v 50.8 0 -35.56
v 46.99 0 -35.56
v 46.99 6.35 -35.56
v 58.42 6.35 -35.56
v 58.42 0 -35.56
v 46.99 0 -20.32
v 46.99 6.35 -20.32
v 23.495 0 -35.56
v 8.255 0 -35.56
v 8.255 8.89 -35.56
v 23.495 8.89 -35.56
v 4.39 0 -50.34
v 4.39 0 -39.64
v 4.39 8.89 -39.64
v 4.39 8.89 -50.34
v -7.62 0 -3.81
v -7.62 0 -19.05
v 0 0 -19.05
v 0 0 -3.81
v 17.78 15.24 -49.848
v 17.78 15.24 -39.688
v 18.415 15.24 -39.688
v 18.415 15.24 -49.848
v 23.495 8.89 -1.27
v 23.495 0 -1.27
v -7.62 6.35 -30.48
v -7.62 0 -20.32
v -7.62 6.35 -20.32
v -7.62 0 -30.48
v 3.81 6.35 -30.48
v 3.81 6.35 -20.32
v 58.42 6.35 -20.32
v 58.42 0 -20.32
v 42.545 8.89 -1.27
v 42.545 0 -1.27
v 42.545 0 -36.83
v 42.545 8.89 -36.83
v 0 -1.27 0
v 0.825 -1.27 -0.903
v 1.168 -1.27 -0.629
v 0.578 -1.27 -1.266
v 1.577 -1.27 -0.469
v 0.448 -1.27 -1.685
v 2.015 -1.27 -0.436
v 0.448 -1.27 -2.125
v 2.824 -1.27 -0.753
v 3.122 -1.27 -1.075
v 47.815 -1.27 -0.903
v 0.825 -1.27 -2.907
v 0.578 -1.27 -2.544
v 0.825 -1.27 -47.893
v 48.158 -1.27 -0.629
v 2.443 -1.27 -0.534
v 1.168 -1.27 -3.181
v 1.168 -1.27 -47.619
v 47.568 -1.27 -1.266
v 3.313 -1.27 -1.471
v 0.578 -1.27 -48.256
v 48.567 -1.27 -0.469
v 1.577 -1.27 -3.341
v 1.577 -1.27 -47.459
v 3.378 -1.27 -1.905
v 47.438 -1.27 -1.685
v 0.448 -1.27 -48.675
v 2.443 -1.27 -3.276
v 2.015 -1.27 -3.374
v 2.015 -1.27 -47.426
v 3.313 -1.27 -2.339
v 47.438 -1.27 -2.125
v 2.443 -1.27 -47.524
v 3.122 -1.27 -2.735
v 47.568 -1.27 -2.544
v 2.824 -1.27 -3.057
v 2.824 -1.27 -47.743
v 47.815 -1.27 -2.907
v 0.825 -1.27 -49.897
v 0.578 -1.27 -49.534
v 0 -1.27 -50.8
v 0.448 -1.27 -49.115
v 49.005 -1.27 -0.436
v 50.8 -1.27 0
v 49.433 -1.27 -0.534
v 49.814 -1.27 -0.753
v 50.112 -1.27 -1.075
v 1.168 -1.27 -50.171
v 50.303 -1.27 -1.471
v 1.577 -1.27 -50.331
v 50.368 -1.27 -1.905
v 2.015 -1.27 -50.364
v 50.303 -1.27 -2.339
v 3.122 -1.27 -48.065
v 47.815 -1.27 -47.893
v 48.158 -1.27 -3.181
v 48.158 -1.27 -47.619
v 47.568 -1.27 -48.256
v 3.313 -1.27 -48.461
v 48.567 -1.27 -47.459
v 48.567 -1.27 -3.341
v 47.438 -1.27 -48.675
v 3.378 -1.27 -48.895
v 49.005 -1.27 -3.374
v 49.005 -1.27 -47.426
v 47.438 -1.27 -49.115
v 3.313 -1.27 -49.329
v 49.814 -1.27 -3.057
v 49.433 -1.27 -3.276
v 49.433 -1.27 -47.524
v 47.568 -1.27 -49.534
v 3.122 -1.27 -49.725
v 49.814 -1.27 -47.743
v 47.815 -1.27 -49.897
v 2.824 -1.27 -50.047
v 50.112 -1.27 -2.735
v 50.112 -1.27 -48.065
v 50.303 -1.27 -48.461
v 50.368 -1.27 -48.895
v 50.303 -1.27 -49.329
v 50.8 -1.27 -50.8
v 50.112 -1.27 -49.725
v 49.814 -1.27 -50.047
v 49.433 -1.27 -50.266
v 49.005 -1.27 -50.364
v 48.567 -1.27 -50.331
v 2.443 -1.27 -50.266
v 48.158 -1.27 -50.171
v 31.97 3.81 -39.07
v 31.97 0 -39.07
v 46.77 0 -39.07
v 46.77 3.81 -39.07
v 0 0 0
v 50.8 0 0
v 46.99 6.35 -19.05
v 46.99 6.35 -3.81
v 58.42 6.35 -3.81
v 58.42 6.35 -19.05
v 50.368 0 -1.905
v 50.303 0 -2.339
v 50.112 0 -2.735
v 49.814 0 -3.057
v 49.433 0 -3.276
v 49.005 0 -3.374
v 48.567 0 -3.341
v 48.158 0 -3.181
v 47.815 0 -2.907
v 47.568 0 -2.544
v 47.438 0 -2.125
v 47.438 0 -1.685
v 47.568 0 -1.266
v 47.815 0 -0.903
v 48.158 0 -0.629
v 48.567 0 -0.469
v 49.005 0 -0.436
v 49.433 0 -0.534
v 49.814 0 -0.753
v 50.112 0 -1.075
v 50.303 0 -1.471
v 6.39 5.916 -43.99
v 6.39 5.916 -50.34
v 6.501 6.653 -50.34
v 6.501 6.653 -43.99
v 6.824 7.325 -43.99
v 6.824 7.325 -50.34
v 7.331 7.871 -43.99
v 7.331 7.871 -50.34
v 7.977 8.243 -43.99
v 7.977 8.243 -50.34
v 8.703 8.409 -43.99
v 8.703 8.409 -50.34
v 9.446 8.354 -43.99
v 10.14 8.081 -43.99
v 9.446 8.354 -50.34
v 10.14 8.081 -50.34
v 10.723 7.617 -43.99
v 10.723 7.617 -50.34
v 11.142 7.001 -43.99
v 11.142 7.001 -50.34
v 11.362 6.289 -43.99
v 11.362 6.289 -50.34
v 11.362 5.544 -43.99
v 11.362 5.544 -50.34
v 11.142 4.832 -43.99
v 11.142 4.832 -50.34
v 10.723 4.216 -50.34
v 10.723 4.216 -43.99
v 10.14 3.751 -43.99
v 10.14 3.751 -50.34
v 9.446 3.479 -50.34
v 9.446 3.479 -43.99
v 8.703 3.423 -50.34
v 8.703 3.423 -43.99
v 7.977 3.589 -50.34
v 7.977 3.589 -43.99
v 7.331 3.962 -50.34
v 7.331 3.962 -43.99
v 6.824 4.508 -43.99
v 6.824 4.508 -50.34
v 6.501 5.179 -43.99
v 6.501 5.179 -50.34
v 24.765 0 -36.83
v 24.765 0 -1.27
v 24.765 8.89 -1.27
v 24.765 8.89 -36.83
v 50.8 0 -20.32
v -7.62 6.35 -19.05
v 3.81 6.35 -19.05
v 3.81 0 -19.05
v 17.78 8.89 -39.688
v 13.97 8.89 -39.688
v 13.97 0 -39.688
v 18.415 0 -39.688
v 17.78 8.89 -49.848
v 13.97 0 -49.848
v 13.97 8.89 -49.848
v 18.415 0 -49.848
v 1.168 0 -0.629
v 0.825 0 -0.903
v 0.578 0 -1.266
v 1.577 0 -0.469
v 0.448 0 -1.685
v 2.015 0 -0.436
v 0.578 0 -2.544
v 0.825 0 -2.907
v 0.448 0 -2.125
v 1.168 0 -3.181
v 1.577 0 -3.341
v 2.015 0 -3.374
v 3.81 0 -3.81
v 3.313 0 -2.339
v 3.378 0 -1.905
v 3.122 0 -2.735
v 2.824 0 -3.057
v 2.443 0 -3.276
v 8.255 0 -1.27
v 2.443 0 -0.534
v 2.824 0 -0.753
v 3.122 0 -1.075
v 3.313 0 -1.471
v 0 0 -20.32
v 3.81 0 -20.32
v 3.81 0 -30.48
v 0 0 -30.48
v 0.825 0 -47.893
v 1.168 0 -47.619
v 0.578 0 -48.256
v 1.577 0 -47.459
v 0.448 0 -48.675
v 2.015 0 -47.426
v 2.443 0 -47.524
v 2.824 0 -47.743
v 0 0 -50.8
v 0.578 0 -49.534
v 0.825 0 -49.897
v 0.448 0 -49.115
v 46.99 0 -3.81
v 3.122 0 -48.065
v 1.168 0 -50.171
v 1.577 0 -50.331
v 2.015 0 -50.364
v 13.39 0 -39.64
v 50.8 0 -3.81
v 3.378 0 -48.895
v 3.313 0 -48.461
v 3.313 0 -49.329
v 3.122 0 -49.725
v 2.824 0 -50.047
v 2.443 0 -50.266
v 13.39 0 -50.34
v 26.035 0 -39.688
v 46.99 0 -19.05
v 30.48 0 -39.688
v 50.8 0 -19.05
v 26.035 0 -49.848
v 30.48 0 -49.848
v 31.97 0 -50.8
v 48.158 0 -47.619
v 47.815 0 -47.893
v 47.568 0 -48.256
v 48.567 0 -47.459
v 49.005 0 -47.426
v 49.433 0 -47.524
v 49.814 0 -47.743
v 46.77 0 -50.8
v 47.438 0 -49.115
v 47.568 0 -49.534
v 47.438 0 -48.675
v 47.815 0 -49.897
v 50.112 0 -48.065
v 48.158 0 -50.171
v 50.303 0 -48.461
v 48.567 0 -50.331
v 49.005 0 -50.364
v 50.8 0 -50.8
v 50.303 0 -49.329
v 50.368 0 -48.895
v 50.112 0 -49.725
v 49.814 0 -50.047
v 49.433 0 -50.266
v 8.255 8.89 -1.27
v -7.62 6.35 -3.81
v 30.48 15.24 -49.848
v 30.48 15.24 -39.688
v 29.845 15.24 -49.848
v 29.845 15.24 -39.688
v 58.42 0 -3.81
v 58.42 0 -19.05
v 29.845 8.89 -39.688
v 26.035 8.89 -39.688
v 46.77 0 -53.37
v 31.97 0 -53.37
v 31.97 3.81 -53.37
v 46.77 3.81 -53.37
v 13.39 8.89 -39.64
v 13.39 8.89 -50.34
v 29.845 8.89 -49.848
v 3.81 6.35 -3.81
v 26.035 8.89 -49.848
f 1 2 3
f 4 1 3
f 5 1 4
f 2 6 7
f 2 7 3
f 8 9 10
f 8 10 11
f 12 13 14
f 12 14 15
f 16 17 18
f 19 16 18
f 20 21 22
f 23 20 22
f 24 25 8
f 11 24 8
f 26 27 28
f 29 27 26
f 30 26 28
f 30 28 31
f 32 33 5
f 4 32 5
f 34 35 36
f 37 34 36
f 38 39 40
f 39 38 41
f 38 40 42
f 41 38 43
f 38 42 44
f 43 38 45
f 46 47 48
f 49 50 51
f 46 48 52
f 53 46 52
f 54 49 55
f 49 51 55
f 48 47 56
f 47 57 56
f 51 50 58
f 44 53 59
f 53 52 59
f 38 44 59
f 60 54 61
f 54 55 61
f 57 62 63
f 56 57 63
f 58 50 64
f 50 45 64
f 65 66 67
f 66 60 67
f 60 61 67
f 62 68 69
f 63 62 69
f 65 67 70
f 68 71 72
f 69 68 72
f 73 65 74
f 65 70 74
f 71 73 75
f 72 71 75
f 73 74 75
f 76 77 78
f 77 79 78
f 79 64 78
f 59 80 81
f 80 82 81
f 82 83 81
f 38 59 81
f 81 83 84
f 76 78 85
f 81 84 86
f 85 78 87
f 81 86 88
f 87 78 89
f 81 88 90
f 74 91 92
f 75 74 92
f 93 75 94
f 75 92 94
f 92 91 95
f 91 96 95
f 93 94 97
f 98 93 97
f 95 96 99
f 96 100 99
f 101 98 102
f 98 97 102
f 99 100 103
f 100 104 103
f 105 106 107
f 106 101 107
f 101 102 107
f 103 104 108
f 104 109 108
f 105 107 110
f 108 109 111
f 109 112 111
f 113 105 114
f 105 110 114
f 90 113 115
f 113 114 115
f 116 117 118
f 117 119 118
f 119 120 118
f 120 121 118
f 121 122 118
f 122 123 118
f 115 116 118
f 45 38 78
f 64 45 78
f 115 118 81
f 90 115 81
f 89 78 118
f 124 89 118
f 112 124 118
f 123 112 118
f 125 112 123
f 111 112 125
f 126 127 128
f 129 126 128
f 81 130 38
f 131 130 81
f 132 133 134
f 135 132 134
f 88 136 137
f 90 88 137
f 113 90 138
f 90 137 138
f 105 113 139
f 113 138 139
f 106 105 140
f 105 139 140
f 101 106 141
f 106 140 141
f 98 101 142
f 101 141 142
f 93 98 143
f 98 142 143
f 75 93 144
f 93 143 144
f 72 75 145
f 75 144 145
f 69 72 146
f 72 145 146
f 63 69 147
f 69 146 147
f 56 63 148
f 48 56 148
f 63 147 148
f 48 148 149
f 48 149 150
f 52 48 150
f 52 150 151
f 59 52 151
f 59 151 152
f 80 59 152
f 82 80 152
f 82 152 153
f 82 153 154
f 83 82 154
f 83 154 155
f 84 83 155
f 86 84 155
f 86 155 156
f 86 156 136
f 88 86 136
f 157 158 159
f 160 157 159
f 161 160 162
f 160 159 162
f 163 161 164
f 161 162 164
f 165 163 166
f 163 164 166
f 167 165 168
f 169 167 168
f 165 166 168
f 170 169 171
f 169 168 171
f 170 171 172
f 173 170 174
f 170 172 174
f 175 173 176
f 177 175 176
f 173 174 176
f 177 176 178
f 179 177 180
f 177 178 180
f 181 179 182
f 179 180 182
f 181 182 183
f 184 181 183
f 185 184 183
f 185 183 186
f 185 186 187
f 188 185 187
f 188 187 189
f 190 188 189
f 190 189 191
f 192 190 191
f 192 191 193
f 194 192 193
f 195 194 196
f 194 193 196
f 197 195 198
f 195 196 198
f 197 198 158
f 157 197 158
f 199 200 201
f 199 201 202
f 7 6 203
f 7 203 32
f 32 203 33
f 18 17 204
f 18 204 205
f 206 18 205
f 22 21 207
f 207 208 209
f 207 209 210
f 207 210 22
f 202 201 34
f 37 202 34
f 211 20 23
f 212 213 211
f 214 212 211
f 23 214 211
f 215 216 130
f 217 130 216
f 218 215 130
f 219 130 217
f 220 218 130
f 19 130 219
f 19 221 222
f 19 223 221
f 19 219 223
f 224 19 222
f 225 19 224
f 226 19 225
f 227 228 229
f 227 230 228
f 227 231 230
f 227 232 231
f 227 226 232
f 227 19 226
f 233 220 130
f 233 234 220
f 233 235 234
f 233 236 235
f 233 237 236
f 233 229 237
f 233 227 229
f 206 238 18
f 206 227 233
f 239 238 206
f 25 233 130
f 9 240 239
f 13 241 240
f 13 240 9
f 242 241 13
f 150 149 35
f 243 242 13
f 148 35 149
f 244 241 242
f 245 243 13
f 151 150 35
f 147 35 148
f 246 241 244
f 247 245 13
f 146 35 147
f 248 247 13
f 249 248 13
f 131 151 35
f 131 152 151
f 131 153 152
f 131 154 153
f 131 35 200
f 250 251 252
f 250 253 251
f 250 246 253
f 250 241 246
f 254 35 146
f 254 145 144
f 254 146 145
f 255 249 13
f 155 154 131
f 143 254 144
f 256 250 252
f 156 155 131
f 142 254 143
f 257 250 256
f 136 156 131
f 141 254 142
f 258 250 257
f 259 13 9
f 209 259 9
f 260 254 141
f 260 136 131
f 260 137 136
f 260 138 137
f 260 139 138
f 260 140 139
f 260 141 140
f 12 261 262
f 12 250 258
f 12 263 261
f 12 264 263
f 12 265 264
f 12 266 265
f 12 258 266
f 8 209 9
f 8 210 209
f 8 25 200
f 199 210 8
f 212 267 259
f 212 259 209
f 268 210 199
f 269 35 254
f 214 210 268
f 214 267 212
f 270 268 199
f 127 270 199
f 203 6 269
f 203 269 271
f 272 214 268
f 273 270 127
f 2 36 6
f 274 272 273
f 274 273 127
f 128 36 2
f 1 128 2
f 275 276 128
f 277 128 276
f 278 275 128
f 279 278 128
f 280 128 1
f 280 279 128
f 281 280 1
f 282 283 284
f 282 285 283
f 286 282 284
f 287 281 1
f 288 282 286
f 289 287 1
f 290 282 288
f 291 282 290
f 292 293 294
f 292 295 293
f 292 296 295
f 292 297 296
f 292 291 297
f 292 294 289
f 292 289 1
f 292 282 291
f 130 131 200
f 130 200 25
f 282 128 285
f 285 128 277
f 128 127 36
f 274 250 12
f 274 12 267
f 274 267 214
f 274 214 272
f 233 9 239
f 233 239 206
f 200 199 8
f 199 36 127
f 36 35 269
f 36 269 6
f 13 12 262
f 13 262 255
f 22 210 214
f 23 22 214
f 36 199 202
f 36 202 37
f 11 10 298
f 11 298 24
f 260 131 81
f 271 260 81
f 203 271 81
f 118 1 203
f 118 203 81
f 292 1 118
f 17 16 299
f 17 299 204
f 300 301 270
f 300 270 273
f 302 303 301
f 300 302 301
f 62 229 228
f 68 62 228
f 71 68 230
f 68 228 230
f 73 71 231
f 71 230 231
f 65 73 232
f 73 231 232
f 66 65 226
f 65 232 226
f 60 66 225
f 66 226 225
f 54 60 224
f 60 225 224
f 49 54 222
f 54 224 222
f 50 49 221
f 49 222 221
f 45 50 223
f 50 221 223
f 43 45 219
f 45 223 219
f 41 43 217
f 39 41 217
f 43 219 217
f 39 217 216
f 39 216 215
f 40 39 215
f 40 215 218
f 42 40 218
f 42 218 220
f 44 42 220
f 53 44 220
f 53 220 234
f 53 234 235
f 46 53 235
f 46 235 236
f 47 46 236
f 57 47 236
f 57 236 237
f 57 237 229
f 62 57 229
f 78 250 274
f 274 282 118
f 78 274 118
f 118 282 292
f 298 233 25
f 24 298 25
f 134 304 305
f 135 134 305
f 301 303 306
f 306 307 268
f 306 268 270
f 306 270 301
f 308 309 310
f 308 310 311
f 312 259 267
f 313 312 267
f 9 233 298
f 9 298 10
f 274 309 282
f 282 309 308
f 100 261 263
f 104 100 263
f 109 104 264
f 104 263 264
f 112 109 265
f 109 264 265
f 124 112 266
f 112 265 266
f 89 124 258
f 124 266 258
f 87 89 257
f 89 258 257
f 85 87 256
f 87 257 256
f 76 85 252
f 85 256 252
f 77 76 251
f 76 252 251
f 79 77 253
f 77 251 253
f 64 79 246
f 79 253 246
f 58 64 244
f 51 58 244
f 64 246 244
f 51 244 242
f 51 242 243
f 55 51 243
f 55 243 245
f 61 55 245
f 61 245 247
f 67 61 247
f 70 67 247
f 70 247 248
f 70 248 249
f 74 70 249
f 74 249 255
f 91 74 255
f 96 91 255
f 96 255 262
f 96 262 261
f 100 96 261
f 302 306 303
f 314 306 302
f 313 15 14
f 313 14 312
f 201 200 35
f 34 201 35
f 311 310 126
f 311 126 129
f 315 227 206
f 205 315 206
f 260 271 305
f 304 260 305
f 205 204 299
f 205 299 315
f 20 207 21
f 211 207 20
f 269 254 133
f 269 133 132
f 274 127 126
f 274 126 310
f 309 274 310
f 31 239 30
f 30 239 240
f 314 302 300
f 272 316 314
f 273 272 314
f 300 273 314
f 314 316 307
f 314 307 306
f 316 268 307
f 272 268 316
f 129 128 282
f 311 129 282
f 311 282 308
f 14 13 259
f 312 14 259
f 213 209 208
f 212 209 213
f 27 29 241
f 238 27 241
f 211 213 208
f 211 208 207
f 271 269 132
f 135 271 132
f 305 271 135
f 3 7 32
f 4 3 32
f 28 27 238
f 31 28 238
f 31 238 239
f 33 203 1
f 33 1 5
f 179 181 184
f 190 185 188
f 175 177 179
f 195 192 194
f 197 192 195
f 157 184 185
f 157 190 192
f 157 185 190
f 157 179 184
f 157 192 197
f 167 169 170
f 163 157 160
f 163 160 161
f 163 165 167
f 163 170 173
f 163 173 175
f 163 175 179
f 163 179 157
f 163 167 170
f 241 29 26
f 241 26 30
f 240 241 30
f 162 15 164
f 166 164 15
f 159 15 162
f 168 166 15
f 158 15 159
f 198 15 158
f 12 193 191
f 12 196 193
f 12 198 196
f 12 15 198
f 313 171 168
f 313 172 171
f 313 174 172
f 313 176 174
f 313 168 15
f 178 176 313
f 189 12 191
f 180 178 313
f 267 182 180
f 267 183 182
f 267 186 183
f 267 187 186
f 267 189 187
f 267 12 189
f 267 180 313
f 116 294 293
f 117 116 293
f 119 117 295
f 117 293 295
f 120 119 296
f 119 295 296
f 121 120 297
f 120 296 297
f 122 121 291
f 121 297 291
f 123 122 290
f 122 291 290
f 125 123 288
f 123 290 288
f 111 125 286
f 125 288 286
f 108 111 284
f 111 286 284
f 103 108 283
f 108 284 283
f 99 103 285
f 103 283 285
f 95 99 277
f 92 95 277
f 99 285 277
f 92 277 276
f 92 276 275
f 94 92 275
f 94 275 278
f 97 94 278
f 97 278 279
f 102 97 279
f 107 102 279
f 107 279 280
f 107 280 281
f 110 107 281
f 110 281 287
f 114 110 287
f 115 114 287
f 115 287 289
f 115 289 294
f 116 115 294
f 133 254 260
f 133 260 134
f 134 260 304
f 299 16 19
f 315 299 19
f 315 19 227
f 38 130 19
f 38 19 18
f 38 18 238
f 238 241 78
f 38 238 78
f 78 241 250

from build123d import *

# Parameters (mm, degrees)
SKETCH5_W           = 50.8
SKETCH5_H           = 50.8
BOSS_EXTRUDE1_DEPTH = 1.27
SKETCH6_W           = 11.43
SKETCH6_H           = 10.16
SKETCH6_H_2         = 15.24
BOSS_EXTRUDE2_DEPTH = 6.35
SKETCH7_W           = 15.24
SKETCH7_H           = 34.29
SKETCH7_W_2         = 17.78
SKETCH7_H_2         = 35.56
BOSS_EXTRUDE3_DEPTH = 8.89
SKETCH8_R           = 1.4732
CUT_EXTRUDE1_DEPTH  = 2.27
SKETCH9_W           = 4.445
SKETCH9_H           = 10.16
BOSS_EXTRUDE4_DEPTH = 8.89
SKETCH11_W          = 0.635
SKETCH11_H          = 10.16
BOSS_EXTRUDE5_DEPTH = 6.35
SKETCH12_W          = 8.999982
SKETCH12_H          = 10.700004
BOSS_EXTRUDE6_DEPTH = 8.89
SKETCH13_W          = 14.8000212
SKETCH13_H          = 14.2999968
BOSS_EXTRUDE7_DEPTH = 3.81
SKETCH17_R          = 2.5
CUT_EXTRUDE2_DEPTH  = 6.35


with BuildPart() as part:
    # Sketch5 → Boss-Extrude1 (new body)
    with BuildSketch(Plane(origin=(0, 0, 0), x_dir=(1, 0, 0), z_dir=(0, 1, 0))):
        with Locations((25.4, 25.4)):
            Rectangle(SKETCH5_W, SKETCH5_H)
    extrude(amount=-BOSS_EXTRUDE1_DEPTH)

    # Sketch6 → Boss-Extrude2 (add)
    with BuildSketch(Plane(origin=(0, 0, 0), x_dir=(1, 0, 0), z_dir=(0, 1, 0))):
        with Locations((-1.905, 25.4)):
            Rectangle(SKETCH6_W, SKETCH6_H)
        with Locations((-1.905, 11.43)):
            Rectangle(SKETCH6_W, SKETCH6_H_2)
        with Locations((52.705, 27.94)):
            Rectangle(SKETCH6_W, SKETCH6_H_2)
        with Locations((52.705, 11.43)):
            Rectangle(SKETCH6_W, SKETCH6_H_2)
    extrude(amount=BOSS_EXTRUDE2_DEPTH)

    # Sketch7 → Boss-Extrude3 (add)
    with BuildSketch(Plane(origin=(0, 0, 0), x_dir=(1, 0, 0), z_dir=(0, 1, 0))):
        with Locations((15.875, 18.415)):
            Rectangle(SKETCH7_W, SKETCH7_H)
        with Locations((33.655, 19.05)):
            Rectangle(SKETCH7_W_2, SKETCH7_H_2)
    extrude(amount=BOSS_EXTRUDE3_DEPTH)

    # Sketch8 → Cut-Extrude1 (cut, through all)
    with BuildSketch(Plane(origin=(0, 0, 0), x_dir=(1, 0, 0), z_dir=(0, 1, 0))):
        with Locations((1.905, 48.895)):
            Circle(SKETCH8_R)
        with Locations((48.895, 48.895)):
            Circle(SKETCH8_R)
        with Locations((1.905, 1.905)):
            Circle(SKETCH8_R)
        with Locations((48.895, 1.905)):
            Circle(SKETCH8_R)
    extrude(amount=-CUT_EXTRUDE1_DEPTH, mode=Mode.SUBTRACT)

    # Sketch9 → Boss-Extrude4 (add)
    with BuildSketch(Plane(origin=(0, 0, 0), x_dir=(1, 0, 0), z_dir=(0, 1, 0))):
        with Locations((28.2575, 44.7675)):
            Rectangle(SKETCH9_W, SKETCH9_H)
        with Locations((16.1925, 44.7675)):
            Rectangle(SKETCH9_W, SKETCH9_H)
    extrude(amount=BOSS_EXTRUDE4_DEPTH)

    # Sketch11 → Boss-Extrude5 (add)
    with BuildSketch(Plane(origin=(0, 8.89, 0), x_dir=(1, 0, 0), z_dir=(0, 1, 0))):
        with Locations((30.1625, 44.7675)):
            Rectangle(SKETCH11_W, SKETCH11_H)
        with Locations((18.0975, 44.7675)):
            Rectangle(SKETCH11_W, SKETCH11_H)
    extrude(amount=BOSS_EXTRUDE5_DEPTH)

    # Sketch12 → Boss-Extrude6 (add)
    with BuildSketch(Plane(origin=(0, 0, 0), x_dir=(1, 0, 0), z_dir=(0, 1, 0))):
        with Locations((8.89, 44.990004)):
            Rectangle(SKETCH12_W, SKETCH12_H)
    extrude(amount=BOSS_EXTRUDE6_DEPTH)

    # Sketch13 → Boss-Extrude7 (add)
    with BuildSketch(Plane(origin=(0, 0, 0), x_dir=(1, 0, 0), z_dir=(0, 1, 0))):
        with Locations((39.37, 46.219999)):
            Rectangle(SKETCH13_W, SKETCH13_H)
    extrude(amount=BOSS_EXTRUDE7_DEPTH)

    # Sketch17 → Cut-Extrude2 (cut)
    with BuildSketch(Plane(origin=(0, 0, -50.340006), x_dir=(-1, 0, 0), z_dir=(0, 0, -1))):
        with Locations((-8.89, 5.916248933)):
            Circle(SKETCH17_R)
    extrude(amount=-CUT_EXTRUDE2_DEPTH, mode=Mode.SUBTRACT)


solid = part.part
